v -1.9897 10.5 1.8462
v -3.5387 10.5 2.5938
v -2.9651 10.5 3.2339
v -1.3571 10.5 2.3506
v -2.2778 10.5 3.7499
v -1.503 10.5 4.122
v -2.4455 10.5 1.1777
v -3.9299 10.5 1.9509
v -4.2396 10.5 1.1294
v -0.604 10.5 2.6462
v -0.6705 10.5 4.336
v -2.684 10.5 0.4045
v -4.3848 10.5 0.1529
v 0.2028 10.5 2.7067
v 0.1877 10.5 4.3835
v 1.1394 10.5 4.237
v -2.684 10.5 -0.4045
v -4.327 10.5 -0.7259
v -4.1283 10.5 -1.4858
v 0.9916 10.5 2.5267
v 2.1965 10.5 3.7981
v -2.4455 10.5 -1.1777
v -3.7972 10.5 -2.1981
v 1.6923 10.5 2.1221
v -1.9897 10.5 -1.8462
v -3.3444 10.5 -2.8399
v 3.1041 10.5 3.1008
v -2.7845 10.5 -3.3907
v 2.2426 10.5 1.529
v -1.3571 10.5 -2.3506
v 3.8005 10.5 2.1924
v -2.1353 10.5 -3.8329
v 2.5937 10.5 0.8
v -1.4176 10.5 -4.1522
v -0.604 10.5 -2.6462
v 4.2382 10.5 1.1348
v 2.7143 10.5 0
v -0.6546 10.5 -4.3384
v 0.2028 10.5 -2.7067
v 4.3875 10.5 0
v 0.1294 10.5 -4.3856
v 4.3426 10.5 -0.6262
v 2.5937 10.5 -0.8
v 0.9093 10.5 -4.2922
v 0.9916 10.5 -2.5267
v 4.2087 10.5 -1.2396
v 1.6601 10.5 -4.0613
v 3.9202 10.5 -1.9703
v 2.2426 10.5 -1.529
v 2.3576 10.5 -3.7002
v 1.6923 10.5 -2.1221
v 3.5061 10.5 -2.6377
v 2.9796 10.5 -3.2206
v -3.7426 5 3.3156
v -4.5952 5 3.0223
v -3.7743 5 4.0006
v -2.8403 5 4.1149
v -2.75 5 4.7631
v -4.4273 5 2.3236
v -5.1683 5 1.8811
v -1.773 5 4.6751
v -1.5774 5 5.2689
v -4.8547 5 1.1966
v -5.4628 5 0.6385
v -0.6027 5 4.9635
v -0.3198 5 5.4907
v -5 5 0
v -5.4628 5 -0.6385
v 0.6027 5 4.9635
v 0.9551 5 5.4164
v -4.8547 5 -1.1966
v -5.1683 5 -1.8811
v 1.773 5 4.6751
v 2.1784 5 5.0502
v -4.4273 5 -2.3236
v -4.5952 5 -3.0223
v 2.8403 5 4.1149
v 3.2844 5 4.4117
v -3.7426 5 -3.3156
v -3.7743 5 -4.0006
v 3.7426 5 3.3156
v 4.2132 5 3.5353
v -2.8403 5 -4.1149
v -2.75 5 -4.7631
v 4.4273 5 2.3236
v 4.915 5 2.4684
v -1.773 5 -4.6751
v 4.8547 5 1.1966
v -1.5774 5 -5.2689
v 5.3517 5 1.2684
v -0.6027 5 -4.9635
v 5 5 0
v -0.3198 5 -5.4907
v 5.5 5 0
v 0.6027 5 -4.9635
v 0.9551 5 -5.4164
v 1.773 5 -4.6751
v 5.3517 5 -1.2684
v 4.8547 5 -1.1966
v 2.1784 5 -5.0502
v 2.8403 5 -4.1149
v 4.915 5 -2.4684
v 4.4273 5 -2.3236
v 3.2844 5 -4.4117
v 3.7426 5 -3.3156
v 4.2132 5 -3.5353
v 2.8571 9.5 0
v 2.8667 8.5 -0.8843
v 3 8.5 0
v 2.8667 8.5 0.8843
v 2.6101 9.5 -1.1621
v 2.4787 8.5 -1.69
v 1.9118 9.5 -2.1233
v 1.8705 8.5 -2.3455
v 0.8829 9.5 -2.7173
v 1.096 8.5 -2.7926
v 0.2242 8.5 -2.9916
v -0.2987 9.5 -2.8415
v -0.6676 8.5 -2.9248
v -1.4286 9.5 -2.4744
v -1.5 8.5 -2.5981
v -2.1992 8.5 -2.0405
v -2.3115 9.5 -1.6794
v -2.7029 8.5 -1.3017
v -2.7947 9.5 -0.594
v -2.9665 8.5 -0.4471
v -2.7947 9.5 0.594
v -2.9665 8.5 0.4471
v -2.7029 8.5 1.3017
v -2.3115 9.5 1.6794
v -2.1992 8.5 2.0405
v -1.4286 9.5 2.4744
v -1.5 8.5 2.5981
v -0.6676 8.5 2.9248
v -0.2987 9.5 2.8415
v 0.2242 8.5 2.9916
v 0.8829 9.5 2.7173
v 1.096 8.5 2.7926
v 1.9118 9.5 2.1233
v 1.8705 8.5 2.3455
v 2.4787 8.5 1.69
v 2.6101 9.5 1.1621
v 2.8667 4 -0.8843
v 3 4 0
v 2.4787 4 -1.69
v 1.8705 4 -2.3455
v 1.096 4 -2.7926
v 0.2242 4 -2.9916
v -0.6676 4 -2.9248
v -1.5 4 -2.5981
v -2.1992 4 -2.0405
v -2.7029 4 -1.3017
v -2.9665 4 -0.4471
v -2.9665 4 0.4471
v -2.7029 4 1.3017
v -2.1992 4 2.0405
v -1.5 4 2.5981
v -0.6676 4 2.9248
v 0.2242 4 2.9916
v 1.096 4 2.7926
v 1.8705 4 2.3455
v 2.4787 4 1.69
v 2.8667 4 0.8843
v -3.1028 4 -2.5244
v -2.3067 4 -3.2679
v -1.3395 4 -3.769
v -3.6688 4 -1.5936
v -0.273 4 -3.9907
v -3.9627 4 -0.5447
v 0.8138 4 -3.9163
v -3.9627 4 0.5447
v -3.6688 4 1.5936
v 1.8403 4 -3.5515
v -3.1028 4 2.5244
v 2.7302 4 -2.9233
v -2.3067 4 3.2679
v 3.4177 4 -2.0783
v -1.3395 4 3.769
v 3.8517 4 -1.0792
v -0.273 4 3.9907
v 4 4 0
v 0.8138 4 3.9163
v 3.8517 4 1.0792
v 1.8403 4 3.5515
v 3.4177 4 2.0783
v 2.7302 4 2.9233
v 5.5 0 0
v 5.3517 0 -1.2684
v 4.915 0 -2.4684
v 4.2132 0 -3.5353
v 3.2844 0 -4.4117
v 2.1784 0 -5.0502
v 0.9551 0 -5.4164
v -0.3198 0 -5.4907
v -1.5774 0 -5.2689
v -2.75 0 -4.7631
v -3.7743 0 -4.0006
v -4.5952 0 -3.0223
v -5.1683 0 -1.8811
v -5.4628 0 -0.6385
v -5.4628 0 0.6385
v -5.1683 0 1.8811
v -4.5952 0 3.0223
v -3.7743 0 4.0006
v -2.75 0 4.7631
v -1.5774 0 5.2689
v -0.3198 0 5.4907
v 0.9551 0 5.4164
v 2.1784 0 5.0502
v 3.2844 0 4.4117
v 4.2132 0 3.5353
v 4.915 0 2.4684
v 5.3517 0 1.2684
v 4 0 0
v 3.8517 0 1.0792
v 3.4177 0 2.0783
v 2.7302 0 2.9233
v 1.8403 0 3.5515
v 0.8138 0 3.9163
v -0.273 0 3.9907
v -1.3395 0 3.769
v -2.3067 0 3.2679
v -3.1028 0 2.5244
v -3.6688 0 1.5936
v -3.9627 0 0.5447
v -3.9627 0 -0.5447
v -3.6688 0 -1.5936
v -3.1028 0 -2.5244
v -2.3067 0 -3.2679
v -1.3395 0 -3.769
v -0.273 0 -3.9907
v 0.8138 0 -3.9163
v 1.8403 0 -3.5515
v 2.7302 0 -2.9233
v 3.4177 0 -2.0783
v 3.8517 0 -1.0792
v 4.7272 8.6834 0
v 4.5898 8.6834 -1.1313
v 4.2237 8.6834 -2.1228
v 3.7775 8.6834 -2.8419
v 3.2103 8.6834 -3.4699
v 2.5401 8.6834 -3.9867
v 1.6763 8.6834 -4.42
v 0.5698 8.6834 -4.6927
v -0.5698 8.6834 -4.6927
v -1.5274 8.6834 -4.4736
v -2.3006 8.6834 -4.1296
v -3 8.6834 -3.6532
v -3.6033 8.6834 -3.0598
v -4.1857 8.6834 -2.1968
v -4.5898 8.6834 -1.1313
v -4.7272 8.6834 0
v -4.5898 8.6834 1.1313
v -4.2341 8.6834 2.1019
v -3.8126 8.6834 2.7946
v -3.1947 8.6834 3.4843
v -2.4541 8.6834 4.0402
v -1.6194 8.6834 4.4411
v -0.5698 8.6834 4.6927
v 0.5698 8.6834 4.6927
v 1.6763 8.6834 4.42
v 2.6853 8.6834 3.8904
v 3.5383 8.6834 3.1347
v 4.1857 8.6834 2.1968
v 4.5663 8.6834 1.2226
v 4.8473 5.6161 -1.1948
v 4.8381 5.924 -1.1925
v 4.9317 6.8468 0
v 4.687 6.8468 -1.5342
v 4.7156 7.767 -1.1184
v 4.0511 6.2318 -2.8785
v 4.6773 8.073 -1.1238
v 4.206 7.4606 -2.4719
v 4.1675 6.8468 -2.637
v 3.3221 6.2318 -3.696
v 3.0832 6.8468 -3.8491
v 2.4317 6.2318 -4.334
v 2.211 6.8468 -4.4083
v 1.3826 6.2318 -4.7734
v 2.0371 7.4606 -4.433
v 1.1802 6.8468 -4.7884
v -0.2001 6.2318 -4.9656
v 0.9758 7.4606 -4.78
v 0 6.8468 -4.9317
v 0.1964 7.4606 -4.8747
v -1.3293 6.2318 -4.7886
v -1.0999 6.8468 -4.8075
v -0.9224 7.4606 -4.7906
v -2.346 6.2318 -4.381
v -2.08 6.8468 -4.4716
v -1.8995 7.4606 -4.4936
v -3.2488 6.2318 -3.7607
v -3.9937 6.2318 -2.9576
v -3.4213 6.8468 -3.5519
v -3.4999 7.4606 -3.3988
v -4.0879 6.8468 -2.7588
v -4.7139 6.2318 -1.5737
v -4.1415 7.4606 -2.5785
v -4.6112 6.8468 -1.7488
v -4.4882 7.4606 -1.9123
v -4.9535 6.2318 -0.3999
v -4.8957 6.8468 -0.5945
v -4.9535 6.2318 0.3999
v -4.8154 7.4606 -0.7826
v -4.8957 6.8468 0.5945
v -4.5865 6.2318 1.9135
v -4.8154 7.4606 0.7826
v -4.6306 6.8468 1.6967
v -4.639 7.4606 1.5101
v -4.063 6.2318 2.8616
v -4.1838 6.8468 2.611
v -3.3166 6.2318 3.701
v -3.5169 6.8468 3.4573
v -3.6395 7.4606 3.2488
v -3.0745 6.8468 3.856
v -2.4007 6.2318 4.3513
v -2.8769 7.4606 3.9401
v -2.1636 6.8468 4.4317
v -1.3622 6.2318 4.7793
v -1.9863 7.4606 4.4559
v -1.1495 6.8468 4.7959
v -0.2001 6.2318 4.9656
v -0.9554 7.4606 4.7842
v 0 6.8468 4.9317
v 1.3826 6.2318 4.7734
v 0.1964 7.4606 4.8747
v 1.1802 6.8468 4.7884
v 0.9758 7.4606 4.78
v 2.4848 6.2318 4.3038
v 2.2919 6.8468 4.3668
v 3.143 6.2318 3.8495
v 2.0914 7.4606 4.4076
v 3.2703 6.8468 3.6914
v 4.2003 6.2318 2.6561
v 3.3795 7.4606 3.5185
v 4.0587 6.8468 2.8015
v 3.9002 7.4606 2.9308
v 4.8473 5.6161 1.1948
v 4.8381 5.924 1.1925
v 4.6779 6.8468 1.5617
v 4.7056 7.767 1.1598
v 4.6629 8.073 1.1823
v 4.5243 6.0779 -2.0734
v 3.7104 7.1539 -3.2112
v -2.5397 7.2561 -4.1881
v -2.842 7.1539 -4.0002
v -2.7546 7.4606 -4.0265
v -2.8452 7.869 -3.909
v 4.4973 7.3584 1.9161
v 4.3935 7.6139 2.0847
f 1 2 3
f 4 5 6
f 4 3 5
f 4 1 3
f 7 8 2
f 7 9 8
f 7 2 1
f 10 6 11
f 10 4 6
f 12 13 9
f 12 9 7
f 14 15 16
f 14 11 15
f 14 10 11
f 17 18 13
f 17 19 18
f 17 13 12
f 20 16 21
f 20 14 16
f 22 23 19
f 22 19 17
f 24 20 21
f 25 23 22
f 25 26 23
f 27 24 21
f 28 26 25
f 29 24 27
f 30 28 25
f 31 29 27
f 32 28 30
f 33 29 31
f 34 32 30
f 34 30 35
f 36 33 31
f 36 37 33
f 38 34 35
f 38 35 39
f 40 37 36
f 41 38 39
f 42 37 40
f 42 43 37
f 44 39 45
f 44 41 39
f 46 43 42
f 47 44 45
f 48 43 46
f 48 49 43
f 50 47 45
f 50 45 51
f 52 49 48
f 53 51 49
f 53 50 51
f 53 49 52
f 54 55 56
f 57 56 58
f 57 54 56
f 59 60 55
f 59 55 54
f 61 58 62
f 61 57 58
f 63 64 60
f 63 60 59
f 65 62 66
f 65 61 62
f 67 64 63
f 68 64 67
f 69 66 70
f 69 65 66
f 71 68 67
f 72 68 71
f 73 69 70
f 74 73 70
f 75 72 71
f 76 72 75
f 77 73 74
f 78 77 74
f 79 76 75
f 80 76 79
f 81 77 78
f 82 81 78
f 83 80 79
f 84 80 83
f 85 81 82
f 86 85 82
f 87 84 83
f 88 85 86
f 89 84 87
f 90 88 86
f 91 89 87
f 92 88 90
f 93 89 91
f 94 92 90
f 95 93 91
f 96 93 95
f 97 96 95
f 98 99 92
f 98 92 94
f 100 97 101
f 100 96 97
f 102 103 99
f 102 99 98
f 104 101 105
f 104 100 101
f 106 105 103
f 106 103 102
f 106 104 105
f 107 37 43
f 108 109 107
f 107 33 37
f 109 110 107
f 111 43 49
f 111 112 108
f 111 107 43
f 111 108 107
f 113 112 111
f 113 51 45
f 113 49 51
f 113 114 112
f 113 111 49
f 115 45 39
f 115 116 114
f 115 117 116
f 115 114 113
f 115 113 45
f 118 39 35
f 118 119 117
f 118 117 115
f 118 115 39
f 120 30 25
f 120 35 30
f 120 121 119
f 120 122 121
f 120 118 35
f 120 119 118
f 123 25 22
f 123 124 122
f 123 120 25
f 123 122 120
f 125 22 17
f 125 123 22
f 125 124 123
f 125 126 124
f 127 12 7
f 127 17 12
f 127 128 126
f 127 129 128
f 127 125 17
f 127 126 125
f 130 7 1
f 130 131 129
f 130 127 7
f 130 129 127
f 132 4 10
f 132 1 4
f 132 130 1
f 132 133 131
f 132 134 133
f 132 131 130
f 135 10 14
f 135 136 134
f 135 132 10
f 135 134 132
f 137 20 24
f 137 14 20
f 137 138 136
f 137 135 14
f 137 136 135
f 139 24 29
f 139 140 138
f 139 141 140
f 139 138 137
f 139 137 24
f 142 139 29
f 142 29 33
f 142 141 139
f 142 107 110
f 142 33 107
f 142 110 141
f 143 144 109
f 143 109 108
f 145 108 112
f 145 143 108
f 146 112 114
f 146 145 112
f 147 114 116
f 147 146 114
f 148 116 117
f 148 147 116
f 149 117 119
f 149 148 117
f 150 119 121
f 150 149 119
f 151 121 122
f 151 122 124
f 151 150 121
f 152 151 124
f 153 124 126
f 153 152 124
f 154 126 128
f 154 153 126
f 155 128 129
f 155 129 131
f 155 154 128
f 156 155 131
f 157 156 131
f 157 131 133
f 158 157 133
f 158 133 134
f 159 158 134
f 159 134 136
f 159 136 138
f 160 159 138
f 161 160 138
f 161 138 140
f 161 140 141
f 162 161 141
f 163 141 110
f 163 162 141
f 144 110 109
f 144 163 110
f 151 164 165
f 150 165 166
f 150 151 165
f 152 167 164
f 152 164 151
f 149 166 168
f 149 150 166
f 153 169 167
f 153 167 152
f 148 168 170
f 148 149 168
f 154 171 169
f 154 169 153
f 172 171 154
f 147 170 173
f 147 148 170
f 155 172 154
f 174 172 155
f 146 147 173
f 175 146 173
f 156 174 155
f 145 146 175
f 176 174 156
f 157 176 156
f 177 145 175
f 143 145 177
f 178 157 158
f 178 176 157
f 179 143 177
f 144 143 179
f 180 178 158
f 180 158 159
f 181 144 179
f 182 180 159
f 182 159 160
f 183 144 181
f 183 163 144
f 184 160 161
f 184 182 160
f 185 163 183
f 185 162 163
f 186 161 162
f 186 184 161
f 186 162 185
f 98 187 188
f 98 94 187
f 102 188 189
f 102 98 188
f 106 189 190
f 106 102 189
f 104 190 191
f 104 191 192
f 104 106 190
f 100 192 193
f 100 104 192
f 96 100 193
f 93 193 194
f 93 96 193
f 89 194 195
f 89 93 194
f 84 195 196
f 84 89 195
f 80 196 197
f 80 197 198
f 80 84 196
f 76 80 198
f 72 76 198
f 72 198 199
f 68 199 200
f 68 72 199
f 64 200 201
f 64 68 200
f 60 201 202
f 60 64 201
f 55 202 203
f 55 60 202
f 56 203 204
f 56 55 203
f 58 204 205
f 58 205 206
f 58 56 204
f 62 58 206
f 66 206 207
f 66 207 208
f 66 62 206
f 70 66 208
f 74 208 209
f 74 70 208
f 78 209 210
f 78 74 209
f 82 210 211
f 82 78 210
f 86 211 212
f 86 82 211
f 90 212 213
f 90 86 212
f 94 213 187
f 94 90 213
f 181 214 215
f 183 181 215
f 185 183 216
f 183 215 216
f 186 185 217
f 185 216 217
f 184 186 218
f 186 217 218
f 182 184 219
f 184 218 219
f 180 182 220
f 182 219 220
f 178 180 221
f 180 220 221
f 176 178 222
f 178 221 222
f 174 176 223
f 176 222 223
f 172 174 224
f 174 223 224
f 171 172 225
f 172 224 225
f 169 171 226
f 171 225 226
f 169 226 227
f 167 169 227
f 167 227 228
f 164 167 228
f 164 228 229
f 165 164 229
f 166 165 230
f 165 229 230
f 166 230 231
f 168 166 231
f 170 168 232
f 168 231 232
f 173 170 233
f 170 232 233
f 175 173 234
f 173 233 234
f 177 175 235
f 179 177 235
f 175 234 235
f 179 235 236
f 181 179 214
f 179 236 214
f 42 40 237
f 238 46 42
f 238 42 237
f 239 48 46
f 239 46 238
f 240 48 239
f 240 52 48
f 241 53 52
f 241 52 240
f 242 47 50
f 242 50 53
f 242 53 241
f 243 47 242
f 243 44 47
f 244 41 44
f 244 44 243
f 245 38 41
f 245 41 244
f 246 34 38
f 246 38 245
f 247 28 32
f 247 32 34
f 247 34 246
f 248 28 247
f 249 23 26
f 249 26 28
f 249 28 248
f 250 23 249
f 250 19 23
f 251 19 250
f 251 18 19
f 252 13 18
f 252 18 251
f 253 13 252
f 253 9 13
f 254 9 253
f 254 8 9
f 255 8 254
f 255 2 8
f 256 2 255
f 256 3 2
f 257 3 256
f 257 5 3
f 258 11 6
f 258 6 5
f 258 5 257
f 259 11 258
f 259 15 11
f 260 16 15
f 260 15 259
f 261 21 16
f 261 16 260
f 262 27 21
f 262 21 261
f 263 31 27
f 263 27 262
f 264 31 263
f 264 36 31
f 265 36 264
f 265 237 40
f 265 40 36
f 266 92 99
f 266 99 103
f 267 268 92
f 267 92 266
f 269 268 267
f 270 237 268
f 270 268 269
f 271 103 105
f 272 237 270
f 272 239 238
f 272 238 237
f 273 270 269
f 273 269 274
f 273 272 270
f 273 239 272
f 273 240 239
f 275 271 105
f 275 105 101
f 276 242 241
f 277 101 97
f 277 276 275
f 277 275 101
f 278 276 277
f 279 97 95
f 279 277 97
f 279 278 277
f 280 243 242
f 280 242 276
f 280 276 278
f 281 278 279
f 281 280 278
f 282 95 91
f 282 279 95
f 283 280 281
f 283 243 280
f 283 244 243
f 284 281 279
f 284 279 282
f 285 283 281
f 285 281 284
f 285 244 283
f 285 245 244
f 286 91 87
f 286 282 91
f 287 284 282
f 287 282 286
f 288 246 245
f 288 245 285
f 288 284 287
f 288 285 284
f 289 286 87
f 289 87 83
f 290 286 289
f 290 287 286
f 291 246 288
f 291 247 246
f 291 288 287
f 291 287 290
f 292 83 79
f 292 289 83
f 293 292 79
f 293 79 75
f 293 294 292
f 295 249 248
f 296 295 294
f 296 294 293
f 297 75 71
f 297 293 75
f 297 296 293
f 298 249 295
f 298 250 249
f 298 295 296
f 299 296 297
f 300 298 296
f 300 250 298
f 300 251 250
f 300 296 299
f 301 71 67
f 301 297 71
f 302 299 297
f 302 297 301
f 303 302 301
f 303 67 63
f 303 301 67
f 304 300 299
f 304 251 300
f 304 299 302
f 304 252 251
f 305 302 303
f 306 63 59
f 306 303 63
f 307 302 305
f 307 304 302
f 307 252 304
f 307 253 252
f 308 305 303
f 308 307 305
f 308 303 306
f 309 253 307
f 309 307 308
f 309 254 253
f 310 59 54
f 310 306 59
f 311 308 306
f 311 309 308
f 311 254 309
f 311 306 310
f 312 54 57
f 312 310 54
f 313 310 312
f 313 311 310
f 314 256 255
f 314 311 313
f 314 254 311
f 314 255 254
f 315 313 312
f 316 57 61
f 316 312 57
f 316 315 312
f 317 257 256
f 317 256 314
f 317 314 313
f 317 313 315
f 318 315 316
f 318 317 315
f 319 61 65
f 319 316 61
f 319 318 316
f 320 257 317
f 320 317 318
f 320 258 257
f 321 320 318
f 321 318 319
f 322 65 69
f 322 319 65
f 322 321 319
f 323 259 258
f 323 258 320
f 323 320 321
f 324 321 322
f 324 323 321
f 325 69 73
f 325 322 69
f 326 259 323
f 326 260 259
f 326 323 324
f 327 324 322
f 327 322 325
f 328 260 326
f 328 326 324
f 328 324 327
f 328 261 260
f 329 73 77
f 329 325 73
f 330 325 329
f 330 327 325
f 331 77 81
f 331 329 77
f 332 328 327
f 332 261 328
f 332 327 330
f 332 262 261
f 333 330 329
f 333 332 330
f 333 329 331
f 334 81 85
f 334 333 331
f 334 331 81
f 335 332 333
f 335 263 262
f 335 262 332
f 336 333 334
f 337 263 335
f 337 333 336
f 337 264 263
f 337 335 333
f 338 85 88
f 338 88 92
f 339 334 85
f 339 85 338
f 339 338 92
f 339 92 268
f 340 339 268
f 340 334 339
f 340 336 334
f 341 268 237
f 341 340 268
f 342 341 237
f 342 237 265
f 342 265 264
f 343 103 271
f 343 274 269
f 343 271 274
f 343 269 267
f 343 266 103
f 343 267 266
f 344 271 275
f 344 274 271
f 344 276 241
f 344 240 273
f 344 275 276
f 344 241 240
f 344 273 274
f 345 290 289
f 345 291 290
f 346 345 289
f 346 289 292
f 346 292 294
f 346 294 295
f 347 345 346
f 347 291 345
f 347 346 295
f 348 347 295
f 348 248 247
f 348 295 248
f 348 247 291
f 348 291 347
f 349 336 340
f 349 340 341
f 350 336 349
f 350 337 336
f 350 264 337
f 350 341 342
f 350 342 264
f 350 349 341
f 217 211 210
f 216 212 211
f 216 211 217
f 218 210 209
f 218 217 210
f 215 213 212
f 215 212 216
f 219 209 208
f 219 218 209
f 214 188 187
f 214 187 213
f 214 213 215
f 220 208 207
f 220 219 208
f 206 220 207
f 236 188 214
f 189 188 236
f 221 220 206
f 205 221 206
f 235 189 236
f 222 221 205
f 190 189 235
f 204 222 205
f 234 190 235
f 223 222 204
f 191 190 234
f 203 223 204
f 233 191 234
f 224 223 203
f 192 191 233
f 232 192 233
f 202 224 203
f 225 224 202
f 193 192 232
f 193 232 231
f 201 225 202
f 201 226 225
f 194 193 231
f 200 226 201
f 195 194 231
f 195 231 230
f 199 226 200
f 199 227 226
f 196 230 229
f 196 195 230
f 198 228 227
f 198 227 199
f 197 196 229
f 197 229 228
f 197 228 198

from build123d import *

# Parameters (mm, degrees)
SKETCH_2_R          = 4
CUT_EXTRUDE_1_DEPTH = 4
SKETCH_3_R          = 5.5
SKETCH_3_R_2        = 2.5
CUT_EXTRUDE_2_DEPTH = 1.5


with BuildPart() as part:
    # Эскиз1 → Повернуть1 (revolve)
    with BuildSketch(Plane.XY):
        with BuildLine():
            Line((3, 0), (5.5, 0))
            Line((5.5, 0), (5.5, 5))
            Line((5.5, 5), (5, 5))
            ThreePointArc((5, 5), (4.748737342, 8.535533906), (4, 12))
            Line((4, 12), (2.5, 12))
            Line((2.5, 12), (3, 8.5))
            Line((3, 8.5), (3, 0))
        make_face()
    revolve(axis=Axis((0, 0, 0), (0, 1, 0)))

    # Эскиз2 → Вырез-Вытянуть1 (cut)
    with BuildSketch(Plane.XZ):
        Circle(SKETCH_2_R)
    extrude(amount=-CUT_EXTRUDE_1_DEPTH, mode=Mode.SUBTRACT)

    # Эскиз3 → Вырез-Вытянуть2 (cut)
    with BuildSketch(Plane(origin=(0, 12, 0), x_dir=(1, 0, 0), z_dir=(0, 1, 0))):
        Circle(SKETCH_3_R)
        Circle(SKETCH_3_R_2, mode=Mode.SUBTRACT)
    extrude(amount=-CUT_EXTRUDE_2_DEPTH, mode=Mode.SUBTRACT)


solid = part.part
